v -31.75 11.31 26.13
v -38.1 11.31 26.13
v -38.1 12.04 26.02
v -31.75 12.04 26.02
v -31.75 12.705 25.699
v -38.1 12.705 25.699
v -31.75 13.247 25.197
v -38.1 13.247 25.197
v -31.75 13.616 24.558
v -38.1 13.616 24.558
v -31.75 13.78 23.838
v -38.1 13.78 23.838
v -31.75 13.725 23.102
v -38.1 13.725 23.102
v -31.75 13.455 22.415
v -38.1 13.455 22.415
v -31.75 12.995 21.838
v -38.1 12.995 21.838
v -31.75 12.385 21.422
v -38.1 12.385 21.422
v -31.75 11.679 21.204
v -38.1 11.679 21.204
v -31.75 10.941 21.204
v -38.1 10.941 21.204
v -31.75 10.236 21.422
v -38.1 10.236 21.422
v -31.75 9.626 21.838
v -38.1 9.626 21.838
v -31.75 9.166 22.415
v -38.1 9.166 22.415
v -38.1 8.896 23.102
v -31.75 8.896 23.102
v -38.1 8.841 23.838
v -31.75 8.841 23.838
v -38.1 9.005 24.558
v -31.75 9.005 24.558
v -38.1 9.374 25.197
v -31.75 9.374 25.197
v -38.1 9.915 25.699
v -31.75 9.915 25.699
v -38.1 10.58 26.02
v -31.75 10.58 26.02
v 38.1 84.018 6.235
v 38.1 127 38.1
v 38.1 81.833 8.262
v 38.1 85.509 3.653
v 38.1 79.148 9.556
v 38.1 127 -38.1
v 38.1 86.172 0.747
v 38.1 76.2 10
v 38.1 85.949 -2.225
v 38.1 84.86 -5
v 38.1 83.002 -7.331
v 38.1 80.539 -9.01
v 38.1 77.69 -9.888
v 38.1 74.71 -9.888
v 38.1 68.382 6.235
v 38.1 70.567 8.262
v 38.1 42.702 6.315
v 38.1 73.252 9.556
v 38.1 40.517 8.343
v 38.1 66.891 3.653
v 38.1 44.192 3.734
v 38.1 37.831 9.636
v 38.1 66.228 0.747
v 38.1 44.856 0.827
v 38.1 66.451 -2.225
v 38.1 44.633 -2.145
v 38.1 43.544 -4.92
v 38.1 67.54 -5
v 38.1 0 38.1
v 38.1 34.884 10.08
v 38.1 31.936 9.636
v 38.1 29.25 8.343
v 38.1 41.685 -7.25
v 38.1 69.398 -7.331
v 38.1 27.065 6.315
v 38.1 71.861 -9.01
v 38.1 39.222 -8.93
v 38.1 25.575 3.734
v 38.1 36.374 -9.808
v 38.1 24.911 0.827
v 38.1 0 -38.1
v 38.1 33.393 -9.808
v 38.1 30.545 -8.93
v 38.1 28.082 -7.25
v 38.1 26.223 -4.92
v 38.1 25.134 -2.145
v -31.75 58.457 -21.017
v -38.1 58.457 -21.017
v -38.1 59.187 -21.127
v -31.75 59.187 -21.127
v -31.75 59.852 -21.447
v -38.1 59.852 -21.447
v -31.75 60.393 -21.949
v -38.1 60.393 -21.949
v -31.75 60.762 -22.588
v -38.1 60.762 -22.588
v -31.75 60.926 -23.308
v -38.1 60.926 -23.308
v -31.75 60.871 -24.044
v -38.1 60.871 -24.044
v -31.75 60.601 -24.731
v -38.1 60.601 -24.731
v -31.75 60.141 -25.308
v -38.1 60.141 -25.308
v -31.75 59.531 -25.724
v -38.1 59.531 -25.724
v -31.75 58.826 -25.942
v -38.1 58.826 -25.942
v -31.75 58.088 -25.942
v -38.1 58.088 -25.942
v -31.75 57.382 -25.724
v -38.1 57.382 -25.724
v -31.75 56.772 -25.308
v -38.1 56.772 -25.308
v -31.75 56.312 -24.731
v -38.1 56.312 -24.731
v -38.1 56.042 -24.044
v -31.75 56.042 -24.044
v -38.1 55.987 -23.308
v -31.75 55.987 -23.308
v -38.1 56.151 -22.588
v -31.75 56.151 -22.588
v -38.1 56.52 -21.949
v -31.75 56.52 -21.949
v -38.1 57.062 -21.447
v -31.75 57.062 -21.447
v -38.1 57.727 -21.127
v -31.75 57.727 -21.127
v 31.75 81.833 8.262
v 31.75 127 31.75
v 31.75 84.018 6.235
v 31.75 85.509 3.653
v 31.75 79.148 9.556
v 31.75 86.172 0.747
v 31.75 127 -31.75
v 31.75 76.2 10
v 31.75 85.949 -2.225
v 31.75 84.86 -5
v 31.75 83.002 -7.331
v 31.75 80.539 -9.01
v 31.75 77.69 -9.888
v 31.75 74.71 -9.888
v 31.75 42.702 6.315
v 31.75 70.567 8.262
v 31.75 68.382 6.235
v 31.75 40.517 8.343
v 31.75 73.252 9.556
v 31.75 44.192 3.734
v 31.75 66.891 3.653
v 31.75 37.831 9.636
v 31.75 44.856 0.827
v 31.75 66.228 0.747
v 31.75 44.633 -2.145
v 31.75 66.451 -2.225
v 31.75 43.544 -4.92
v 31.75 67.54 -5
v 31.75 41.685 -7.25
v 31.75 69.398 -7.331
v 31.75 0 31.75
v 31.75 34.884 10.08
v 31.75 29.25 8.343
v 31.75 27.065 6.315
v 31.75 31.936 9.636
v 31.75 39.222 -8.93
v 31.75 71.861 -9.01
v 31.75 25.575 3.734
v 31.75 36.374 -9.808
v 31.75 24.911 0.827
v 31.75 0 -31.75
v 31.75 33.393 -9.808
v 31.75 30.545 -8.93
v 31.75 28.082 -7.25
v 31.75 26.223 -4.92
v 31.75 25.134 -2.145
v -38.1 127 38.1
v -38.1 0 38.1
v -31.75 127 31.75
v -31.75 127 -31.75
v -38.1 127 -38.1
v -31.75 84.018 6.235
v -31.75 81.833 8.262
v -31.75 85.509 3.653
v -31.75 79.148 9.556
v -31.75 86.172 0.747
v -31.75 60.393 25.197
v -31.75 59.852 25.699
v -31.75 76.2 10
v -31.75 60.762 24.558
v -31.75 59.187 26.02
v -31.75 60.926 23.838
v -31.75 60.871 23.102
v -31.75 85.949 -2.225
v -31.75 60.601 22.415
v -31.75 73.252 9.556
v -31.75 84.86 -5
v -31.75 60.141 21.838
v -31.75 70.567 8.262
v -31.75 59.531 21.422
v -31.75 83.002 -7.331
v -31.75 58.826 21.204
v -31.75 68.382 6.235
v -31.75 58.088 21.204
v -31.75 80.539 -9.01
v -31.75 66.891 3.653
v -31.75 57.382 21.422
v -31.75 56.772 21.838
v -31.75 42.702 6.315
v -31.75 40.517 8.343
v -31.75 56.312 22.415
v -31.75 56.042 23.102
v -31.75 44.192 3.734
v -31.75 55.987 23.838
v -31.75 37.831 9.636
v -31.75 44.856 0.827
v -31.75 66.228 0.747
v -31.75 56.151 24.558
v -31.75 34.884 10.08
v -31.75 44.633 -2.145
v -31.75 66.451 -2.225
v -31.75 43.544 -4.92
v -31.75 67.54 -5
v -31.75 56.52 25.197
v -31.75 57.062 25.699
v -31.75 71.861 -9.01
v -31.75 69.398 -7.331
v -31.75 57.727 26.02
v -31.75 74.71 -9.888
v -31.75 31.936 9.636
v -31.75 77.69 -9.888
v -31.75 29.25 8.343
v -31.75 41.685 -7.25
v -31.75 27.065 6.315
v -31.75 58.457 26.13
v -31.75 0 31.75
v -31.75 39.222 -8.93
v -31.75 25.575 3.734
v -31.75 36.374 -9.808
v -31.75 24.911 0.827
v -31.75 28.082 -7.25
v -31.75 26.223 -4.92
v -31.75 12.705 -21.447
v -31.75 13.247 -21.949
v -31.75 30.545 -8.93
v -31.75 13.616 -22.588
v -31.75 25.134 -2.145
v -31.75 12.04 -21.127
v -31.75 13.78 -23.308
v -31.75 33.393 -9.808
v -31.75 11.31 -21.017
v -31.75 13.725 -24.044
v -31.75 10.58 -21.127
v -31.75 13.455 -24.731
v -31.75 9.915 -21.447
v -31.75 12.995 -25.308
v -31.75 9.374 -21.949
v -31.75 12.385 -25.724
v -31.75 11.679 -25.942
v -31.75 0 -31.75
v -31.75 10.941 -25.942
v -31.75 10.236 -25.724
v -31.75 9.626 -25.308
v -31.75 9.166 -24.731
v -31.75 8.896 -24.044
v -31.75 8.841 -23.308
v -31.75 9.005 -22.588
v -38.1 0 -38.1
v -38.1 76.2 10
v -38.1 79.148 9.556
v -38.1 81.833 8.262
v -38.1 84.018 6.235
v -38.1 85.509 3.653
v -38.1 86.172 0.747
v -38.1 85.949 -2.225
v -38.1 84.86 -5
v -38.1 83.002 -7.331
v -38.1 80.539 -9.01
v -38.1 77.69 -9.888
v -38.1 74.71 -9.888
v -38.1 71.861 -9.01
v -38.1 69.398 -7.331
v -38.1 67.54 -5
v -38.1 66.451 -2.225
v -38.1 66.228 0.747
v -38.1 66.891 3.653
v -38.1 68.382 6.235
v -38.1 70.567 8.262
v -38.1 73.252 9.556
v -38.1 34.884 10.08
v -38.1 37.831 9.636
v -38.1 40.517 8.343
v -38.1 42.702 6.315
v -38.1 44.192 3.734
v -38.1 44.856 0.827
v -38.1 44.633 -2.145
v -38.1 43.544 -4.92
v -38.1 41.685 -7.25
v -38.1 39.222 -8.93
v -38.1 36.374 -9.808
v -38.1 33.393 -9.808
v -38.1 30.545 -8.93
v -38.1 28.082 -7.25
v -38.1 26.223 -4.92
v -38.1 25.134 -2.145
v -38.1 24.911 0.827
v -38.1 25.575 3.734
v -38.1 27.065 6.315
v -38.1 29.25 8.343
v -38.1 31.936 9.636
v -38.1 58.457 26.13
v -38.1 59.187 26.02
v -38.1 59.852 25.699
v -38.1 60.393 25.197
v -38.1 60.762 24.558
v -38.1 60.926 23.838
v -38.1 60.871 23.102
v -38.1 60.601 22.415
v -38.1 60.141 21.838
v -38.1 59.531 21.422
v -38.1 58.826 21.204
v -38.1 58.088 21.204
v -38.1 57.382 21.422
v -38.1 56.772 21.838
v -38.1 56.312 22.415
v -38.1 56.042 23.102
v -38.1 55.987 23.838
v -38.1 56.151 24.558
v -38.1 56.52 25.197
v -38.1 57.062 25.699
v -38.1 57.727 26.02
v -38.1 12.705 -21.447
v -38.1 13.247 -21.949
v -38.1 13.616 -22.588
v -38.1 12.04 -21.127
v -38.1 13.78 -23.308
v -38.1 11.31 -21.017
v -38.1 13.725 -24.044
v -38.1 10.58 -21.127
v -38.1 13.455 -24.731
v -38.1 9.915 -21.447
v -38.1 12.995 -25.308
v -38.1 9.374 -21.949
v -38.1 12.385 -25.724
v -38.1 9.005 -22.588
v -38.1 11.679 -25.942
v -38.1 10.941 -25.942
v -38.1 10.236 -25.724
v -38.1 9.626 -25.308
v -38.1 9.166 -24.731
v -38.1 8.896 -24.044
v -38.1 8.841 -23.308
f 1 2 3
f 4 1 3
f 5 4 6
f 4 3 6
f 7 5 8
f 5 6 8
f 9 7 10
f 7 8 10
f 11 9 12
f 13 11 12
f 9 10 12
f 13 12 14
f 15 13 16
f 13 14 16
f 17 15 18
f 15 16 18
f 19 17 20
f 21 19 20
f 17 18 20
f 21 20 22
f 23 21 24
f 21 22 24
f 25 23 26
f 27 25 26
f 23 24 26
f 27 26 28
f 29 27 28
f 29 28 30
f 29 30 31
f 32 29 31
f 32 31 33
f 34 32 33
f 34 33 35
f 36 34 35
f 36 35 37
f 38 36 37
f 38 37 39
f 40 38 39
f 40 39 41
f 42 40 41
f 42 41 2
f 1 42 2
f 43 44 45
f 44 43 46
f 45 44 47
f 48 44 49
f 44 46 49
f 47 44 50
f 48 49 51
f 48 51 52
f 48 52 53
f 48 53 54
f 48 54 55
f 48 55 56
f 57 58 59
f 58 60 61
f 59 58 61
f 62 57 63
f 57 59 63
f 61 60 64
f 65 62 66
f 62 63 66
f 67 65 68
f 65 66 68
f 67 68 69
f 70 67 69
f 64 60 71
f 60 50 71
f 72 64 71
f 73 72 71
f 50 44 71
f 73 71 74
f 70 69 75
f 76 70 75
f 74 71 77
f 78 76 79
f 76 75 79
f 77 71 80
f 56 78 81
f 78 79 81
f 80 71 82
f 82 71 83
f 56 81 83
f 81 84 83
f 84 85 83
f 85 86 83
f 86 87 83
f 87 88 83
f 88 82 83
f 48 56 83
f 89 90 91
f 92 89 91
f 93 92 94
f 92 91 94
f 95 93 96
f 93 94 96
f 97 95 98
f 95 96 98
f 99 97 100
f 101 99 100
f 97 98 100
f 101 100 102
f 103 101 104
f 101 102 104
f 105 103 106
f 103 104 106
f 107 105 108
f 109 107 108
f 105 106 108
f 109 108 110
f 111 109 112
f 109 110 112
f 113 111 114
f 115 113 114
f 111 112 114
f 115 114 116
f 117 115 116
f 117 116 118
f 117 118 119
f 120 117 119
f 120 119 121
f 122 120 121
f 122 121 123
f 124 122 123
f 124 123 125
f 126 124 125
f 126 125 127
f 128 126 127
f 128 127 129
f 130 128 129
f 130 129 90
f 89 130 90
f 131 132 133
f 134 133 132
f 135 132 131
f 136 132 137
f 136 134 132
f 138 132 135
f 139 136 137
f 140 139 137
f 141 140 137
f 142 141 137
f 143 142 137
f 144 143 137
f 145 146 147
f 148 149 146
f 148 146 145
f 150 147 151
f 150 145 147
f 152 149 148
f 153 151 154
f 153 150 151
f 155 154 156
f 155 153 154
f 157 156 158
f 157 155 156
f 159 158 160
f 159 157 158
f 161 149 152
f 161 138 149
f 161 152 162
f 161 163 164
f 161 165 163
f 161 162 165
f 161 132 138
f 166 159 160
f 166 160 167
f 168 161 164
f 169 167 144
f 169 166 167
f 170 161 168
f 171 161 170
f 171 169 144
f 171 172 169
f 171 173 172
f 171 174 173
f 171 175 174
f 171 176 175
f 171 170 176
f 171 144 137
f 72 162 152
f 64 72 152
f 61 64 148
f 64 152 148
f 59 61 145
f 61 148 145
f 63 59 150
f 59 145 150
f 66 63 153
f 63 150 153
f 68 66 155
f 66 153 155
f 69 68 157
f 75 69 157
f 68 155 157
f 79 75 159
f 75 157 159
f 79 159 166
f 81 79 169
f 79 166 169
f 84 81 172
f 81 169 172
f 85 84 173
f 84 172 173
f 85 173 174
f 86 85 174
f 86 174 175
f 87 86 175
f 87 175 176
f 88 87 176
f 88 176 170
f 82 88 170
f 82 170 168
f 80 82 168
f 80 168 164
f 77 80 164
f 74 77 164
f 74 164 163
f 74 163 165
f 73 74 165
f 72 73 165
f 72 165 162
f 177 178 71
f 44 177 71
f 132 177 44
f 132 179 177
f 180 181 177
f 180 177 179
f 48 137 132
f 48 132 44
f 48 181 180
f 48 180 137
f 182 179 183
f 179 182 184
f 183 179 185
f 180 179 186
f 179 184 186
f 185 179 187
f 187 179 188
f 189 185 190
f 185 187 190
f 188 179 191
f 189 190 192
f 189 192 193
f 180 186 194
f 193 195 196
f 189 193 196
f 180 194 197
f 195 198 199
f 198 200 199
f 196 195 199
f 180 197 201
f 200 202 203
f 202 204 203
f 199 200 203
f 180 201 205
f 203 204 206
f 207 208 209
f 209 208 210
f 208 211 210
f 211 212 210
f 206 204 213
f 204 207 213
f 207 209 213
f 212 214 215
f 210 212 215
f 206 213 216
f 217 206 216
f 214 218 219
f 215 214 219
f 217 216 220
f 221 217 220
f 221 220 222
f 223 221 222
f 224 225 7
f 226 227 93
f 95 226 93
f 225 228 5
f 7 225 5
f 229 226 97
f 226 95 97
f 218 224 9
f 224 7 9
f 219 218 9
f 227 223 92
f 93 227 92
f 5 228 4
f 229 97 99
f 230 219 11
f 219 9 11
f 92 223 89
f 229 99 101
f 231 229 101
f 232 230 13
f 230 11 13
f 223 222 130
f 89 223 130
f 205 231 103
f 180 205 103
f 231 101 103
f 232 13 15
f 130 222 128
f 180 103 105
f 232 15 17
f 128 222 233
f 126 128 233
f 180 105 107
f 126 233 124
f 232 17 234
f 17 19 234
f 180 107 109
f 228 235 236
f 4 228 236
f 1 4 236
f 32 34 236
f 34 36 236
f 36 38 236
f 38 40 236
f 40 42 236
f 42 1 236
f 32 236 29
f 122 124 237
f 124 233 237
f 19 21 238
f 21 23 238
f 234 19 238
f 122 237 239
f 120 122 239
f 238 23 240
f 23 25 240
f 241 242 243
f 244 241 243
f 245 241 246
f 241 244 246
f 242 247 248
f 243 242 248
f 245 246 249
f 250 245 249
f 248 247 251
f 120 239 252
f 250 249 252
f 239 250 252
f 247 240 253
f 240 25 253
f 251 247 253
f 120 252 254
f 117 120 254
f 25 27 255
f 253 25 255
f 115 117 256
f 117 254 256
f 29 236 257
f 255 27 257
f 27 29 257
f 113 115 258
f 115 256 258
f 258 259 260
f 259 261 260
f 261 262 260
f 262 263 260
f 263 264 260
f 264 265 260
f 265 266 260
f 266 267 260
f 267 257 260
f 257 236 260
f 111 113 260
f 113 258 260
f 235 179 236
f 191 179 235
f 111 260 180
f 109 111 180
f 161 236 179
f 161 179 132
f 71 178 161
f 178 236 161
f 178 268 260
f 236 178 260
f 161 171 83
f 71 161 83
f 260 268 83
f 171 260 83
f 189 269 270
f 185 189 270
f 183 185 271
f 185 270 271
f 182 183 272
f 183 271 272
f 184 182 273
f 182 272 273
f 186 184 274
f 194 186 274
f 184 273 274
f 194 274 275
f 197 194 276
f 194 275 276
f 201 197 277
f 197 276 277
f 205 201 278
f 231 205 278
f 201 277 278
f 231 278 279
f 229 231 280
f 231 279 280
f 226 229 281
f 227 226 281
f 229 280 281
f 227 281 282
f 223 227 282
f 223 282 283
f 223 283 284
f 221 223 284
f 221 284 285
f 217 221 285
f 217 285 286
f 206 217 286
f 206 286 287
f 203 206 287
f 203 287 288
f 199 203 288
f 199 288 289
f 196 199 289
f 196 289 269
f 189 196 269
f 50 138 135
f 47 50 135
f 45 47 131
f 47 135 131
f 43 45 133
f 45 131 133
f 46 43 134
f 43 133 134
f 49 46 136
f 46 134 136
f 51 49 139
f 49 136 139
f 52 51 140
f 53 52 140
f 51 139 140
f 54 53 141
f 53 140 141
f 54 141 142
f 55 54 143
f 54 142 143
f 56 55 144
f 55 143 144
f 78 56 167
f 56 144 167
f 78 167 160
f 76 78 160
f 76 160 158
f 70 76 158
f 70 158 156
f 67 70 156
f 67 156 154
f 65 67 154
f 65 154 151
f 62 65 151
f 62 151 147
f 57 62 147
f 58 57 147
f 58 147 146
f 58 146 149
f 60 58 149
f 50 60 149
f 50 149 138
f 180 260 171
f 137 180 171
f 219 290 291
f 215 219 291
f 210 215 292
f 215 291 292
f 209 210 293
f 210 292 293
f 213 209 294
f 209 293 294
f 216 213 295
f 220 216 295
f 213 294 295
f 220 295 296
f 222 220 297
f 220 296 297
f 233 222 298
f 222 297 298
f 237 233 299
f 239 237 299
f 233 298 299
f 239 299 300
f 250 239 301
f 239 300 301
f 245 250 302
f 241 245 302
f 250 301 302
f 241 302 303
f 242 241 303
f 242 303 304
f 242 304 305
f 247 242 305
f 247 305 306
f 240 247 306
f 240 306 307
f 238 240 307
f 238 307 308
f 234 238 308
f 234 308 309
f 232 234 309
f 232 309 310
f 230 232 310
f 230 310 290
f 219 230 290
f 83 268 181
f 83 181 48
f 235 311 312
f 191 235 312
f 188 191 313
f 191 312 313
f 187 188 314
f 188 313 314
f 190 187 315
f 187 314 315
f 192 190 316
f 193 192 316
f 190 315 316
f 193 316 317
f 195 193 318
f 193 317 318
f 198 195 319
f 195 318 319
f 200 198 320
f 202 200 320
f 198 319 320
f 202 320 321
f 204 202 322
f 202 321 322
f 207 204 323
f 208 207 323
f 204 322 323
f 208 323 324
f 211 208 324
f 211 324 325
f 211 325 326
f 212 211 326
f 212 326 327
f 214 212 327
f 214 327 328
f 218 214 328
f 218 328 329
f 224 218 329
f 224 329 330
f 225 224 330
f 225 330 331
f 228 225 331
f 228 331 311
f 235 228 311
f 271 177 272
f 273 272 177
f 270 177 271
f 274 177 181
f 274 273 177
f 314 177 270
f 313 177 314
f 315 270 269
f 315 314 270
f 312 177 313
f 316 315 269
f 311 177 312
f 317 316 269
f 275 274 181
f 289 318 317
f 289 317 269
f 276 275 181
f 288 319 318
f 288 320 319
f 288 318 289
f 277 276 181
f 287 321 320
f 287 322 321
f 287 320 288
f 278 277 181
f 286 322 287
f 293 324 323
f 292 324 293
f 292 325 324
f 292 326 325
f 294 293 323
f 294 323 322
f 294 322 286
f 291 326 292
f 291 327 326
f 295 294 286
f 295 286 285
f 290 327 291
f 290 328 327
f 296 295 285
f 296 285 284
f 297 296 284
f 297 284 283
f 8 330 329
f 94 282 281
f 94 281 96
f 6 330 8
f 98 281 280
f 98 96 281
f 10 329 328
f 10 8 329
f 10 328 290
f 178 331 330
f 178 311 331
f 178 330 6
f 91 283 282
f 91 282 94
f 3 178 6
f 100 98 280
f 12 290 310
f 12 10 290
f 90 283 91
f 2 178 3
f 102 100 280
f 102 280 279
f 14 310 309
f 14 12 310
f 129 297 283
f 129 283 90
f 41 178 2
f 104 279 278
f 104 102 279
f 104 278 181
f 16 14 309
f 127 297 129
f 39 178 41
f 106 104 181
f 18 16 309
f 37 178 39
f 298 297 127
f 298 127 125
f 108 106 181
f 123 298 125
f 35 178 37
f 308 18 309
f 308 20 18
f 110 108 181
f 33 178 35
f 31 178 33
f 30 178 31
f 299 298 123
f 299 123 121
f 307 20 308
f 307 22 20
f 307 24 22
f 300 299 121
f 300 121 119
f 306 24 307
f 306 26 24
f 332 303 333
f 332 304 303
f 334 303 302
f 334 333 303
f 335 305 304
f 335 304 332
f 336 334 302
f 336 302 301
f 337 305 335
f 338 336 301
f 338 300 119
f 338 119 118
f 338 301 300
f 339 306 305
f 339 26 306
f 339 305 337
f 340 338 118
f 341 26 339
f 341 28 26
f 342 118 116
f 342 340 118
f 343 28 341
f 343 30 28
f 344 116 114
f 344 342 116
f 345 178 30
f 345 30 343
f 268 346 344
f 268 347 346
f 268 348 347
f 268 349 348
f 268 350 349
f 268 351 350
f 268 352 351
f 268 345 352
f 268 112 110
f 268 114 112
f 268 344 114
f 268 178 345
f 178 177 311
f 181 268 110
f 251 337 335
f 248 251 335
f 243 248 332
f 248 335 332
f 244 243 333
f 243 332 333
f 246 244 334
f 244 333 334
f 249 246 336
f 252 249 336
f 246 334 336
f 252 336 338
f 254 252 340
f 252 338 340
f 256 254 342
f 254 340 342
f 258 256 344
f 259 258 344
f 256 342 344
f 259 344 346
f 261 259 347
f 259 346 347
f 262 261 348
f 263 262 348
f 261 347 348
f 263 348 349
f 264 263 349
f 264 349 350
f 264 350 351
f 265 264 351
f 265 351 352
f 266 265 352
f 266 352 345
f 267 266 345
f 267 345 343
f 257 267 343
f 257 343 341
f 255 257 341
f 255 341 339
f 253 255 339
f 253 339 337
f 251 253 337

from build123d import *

# Parameters (mm, degrees)
SKETCH1_W           = 76.2
SKETCH1_H           = 76.2
SKETCH1_W_2         = 63.5
SKETCH1_H_2         = 63.5
BOSS_EXTRUDE3_DEPTH = 127
CUT_EXTRUDE4_REACH  = 154.928
SKETCH5_R           = 2.4765
SKETCH5_3_R         = 10
CUT_EXTRUDE5_DEPTH  = 153.928251151
SKETCH6_R           = 10
CUT_EXTRUDE6_DEPTH  = 153.928251151


with BuildPart() as part:
    # Sketch1 → Boss-Extrude3 (new body)
    with BuildSketch(Plane(origin=(0, 0, 0), x_dir=(1, 0, 0), z_dir=(0, 1, 0))):
        Rectangle(SKETCH1_W, SKETCH1_H)
        Rectangle(SKETCH1_W_2, SKETCH1_H_2, mode=Mode.SUBTRACT)
    extrude(amount=BOSS_EXTRUDE3_DEPTH)

    # Sketch5 → Cut-Extrude4 (cut, up to next)
    with BuildSketch(Plane.ZY.offset(38.1), mode=Mode.PRIVATE) as cut_extrude4_sk1:
        with Locations((-23.493043794, 58.456697864)):
            Circle(SKETCH5_R)
    cut_extrude4_tool1 = extrude(cut_extrude4_sk1.sketch, amount=-CUT_EXTRUDE4_REACH, mode=Mode.PRIVATE) & part.part
    # Sketch5 → Cut-Extrude4 (cut, up to next)
    with BuildSketch(Plane.ZY.offset(38.1), mode=Mode.PRIVATE) as cut_extrude4_sk2:
        with Locations((23.653300841, 58.456697864)):
            Circle(SKETCH5_R)
    cut_extrude4_tool2 = extrude(cut_extrude4_sk2.sketch, amount=-CUT_EXTRUDE4_REACH, mode=Mode.PRIVATE) & part.part
    # Sketch5 → Cut-Extrude4 (cut, up to next)
    with BuildSketch(Plane.ZY.offset(38.1), mode=Mode.PRIVATE) as cut_extrude4_sk3:
        with Locations((23.653300841, 11.310353228)):
            Circle(SKETCH5_R)
    cut_extrude4_tool3 = extrude(cut_extrude4_sk3.sketch, amount=-CUT_EXTRUDE4_REACH, mode=Mode.PRIVATE) & part.part
    # Sketch5 → Cut-Extrude4 (cut, up to next)
    with BuildSketch(Plane.ZY.offset(38.1), mode=Mode.PRIVATE) as cut_extrude4_sk4:
        with Locations((-23.493043794, 11.310353228)):
            Circle(SKETCH5_R)
    cut_extrude4_tool4 = extrude(cut_extrude4_sk4.sketch, amount=-CUT_EXTRUDE4_REACH, mode=Mode.PRIVATE) & part.part
    add(cut_extrude4_tool1.solids().sort_by_distance((-38.1, 58.456698, -23.493044))[0], mode=Mode.SUBTRACT)
    add(cut_extrude4_tool2.solids().sort_by_distance((-38.1, 58.456698, 23.653301))[0], mode=Mode.SUBTRACT)
    add(cut_extrude4_tool3.solids().sort_by_distance((-38.1, 11.310353, 23.653301))[0], mode=Mode.SUBTRACT)
    add(cut_extrude4_tool4.solids().sort_by_distance((-38.1, 11.310353, -23.493044))[0], mode=Mode.SUBTRACT)

    # Sketch5<3> → Cut-Extrude5 (cut, through all)
    with BuildSketch(Plane.ZY.offset(38.1)):
        with Locations((0.080128523, 34.883525546)):
            Circle(SKETCH5_3_R)
    extrude(amount=-CUT_EXTRUDE5_DEPTH, mode=Mode.SUBTRACT)

    # Sketch6 → Cut-Extrude6 (cut, through all)
    with BuildSketch(Plane.ZY.offset(38.1)):
        with Locations((0, 76.2)):
            Circle(SKETCH6_R)
    extrude(amount=-CUT_EXTRUDE6_DEPTH, mode=Mode.SUBTRACT)


solid = part.part
